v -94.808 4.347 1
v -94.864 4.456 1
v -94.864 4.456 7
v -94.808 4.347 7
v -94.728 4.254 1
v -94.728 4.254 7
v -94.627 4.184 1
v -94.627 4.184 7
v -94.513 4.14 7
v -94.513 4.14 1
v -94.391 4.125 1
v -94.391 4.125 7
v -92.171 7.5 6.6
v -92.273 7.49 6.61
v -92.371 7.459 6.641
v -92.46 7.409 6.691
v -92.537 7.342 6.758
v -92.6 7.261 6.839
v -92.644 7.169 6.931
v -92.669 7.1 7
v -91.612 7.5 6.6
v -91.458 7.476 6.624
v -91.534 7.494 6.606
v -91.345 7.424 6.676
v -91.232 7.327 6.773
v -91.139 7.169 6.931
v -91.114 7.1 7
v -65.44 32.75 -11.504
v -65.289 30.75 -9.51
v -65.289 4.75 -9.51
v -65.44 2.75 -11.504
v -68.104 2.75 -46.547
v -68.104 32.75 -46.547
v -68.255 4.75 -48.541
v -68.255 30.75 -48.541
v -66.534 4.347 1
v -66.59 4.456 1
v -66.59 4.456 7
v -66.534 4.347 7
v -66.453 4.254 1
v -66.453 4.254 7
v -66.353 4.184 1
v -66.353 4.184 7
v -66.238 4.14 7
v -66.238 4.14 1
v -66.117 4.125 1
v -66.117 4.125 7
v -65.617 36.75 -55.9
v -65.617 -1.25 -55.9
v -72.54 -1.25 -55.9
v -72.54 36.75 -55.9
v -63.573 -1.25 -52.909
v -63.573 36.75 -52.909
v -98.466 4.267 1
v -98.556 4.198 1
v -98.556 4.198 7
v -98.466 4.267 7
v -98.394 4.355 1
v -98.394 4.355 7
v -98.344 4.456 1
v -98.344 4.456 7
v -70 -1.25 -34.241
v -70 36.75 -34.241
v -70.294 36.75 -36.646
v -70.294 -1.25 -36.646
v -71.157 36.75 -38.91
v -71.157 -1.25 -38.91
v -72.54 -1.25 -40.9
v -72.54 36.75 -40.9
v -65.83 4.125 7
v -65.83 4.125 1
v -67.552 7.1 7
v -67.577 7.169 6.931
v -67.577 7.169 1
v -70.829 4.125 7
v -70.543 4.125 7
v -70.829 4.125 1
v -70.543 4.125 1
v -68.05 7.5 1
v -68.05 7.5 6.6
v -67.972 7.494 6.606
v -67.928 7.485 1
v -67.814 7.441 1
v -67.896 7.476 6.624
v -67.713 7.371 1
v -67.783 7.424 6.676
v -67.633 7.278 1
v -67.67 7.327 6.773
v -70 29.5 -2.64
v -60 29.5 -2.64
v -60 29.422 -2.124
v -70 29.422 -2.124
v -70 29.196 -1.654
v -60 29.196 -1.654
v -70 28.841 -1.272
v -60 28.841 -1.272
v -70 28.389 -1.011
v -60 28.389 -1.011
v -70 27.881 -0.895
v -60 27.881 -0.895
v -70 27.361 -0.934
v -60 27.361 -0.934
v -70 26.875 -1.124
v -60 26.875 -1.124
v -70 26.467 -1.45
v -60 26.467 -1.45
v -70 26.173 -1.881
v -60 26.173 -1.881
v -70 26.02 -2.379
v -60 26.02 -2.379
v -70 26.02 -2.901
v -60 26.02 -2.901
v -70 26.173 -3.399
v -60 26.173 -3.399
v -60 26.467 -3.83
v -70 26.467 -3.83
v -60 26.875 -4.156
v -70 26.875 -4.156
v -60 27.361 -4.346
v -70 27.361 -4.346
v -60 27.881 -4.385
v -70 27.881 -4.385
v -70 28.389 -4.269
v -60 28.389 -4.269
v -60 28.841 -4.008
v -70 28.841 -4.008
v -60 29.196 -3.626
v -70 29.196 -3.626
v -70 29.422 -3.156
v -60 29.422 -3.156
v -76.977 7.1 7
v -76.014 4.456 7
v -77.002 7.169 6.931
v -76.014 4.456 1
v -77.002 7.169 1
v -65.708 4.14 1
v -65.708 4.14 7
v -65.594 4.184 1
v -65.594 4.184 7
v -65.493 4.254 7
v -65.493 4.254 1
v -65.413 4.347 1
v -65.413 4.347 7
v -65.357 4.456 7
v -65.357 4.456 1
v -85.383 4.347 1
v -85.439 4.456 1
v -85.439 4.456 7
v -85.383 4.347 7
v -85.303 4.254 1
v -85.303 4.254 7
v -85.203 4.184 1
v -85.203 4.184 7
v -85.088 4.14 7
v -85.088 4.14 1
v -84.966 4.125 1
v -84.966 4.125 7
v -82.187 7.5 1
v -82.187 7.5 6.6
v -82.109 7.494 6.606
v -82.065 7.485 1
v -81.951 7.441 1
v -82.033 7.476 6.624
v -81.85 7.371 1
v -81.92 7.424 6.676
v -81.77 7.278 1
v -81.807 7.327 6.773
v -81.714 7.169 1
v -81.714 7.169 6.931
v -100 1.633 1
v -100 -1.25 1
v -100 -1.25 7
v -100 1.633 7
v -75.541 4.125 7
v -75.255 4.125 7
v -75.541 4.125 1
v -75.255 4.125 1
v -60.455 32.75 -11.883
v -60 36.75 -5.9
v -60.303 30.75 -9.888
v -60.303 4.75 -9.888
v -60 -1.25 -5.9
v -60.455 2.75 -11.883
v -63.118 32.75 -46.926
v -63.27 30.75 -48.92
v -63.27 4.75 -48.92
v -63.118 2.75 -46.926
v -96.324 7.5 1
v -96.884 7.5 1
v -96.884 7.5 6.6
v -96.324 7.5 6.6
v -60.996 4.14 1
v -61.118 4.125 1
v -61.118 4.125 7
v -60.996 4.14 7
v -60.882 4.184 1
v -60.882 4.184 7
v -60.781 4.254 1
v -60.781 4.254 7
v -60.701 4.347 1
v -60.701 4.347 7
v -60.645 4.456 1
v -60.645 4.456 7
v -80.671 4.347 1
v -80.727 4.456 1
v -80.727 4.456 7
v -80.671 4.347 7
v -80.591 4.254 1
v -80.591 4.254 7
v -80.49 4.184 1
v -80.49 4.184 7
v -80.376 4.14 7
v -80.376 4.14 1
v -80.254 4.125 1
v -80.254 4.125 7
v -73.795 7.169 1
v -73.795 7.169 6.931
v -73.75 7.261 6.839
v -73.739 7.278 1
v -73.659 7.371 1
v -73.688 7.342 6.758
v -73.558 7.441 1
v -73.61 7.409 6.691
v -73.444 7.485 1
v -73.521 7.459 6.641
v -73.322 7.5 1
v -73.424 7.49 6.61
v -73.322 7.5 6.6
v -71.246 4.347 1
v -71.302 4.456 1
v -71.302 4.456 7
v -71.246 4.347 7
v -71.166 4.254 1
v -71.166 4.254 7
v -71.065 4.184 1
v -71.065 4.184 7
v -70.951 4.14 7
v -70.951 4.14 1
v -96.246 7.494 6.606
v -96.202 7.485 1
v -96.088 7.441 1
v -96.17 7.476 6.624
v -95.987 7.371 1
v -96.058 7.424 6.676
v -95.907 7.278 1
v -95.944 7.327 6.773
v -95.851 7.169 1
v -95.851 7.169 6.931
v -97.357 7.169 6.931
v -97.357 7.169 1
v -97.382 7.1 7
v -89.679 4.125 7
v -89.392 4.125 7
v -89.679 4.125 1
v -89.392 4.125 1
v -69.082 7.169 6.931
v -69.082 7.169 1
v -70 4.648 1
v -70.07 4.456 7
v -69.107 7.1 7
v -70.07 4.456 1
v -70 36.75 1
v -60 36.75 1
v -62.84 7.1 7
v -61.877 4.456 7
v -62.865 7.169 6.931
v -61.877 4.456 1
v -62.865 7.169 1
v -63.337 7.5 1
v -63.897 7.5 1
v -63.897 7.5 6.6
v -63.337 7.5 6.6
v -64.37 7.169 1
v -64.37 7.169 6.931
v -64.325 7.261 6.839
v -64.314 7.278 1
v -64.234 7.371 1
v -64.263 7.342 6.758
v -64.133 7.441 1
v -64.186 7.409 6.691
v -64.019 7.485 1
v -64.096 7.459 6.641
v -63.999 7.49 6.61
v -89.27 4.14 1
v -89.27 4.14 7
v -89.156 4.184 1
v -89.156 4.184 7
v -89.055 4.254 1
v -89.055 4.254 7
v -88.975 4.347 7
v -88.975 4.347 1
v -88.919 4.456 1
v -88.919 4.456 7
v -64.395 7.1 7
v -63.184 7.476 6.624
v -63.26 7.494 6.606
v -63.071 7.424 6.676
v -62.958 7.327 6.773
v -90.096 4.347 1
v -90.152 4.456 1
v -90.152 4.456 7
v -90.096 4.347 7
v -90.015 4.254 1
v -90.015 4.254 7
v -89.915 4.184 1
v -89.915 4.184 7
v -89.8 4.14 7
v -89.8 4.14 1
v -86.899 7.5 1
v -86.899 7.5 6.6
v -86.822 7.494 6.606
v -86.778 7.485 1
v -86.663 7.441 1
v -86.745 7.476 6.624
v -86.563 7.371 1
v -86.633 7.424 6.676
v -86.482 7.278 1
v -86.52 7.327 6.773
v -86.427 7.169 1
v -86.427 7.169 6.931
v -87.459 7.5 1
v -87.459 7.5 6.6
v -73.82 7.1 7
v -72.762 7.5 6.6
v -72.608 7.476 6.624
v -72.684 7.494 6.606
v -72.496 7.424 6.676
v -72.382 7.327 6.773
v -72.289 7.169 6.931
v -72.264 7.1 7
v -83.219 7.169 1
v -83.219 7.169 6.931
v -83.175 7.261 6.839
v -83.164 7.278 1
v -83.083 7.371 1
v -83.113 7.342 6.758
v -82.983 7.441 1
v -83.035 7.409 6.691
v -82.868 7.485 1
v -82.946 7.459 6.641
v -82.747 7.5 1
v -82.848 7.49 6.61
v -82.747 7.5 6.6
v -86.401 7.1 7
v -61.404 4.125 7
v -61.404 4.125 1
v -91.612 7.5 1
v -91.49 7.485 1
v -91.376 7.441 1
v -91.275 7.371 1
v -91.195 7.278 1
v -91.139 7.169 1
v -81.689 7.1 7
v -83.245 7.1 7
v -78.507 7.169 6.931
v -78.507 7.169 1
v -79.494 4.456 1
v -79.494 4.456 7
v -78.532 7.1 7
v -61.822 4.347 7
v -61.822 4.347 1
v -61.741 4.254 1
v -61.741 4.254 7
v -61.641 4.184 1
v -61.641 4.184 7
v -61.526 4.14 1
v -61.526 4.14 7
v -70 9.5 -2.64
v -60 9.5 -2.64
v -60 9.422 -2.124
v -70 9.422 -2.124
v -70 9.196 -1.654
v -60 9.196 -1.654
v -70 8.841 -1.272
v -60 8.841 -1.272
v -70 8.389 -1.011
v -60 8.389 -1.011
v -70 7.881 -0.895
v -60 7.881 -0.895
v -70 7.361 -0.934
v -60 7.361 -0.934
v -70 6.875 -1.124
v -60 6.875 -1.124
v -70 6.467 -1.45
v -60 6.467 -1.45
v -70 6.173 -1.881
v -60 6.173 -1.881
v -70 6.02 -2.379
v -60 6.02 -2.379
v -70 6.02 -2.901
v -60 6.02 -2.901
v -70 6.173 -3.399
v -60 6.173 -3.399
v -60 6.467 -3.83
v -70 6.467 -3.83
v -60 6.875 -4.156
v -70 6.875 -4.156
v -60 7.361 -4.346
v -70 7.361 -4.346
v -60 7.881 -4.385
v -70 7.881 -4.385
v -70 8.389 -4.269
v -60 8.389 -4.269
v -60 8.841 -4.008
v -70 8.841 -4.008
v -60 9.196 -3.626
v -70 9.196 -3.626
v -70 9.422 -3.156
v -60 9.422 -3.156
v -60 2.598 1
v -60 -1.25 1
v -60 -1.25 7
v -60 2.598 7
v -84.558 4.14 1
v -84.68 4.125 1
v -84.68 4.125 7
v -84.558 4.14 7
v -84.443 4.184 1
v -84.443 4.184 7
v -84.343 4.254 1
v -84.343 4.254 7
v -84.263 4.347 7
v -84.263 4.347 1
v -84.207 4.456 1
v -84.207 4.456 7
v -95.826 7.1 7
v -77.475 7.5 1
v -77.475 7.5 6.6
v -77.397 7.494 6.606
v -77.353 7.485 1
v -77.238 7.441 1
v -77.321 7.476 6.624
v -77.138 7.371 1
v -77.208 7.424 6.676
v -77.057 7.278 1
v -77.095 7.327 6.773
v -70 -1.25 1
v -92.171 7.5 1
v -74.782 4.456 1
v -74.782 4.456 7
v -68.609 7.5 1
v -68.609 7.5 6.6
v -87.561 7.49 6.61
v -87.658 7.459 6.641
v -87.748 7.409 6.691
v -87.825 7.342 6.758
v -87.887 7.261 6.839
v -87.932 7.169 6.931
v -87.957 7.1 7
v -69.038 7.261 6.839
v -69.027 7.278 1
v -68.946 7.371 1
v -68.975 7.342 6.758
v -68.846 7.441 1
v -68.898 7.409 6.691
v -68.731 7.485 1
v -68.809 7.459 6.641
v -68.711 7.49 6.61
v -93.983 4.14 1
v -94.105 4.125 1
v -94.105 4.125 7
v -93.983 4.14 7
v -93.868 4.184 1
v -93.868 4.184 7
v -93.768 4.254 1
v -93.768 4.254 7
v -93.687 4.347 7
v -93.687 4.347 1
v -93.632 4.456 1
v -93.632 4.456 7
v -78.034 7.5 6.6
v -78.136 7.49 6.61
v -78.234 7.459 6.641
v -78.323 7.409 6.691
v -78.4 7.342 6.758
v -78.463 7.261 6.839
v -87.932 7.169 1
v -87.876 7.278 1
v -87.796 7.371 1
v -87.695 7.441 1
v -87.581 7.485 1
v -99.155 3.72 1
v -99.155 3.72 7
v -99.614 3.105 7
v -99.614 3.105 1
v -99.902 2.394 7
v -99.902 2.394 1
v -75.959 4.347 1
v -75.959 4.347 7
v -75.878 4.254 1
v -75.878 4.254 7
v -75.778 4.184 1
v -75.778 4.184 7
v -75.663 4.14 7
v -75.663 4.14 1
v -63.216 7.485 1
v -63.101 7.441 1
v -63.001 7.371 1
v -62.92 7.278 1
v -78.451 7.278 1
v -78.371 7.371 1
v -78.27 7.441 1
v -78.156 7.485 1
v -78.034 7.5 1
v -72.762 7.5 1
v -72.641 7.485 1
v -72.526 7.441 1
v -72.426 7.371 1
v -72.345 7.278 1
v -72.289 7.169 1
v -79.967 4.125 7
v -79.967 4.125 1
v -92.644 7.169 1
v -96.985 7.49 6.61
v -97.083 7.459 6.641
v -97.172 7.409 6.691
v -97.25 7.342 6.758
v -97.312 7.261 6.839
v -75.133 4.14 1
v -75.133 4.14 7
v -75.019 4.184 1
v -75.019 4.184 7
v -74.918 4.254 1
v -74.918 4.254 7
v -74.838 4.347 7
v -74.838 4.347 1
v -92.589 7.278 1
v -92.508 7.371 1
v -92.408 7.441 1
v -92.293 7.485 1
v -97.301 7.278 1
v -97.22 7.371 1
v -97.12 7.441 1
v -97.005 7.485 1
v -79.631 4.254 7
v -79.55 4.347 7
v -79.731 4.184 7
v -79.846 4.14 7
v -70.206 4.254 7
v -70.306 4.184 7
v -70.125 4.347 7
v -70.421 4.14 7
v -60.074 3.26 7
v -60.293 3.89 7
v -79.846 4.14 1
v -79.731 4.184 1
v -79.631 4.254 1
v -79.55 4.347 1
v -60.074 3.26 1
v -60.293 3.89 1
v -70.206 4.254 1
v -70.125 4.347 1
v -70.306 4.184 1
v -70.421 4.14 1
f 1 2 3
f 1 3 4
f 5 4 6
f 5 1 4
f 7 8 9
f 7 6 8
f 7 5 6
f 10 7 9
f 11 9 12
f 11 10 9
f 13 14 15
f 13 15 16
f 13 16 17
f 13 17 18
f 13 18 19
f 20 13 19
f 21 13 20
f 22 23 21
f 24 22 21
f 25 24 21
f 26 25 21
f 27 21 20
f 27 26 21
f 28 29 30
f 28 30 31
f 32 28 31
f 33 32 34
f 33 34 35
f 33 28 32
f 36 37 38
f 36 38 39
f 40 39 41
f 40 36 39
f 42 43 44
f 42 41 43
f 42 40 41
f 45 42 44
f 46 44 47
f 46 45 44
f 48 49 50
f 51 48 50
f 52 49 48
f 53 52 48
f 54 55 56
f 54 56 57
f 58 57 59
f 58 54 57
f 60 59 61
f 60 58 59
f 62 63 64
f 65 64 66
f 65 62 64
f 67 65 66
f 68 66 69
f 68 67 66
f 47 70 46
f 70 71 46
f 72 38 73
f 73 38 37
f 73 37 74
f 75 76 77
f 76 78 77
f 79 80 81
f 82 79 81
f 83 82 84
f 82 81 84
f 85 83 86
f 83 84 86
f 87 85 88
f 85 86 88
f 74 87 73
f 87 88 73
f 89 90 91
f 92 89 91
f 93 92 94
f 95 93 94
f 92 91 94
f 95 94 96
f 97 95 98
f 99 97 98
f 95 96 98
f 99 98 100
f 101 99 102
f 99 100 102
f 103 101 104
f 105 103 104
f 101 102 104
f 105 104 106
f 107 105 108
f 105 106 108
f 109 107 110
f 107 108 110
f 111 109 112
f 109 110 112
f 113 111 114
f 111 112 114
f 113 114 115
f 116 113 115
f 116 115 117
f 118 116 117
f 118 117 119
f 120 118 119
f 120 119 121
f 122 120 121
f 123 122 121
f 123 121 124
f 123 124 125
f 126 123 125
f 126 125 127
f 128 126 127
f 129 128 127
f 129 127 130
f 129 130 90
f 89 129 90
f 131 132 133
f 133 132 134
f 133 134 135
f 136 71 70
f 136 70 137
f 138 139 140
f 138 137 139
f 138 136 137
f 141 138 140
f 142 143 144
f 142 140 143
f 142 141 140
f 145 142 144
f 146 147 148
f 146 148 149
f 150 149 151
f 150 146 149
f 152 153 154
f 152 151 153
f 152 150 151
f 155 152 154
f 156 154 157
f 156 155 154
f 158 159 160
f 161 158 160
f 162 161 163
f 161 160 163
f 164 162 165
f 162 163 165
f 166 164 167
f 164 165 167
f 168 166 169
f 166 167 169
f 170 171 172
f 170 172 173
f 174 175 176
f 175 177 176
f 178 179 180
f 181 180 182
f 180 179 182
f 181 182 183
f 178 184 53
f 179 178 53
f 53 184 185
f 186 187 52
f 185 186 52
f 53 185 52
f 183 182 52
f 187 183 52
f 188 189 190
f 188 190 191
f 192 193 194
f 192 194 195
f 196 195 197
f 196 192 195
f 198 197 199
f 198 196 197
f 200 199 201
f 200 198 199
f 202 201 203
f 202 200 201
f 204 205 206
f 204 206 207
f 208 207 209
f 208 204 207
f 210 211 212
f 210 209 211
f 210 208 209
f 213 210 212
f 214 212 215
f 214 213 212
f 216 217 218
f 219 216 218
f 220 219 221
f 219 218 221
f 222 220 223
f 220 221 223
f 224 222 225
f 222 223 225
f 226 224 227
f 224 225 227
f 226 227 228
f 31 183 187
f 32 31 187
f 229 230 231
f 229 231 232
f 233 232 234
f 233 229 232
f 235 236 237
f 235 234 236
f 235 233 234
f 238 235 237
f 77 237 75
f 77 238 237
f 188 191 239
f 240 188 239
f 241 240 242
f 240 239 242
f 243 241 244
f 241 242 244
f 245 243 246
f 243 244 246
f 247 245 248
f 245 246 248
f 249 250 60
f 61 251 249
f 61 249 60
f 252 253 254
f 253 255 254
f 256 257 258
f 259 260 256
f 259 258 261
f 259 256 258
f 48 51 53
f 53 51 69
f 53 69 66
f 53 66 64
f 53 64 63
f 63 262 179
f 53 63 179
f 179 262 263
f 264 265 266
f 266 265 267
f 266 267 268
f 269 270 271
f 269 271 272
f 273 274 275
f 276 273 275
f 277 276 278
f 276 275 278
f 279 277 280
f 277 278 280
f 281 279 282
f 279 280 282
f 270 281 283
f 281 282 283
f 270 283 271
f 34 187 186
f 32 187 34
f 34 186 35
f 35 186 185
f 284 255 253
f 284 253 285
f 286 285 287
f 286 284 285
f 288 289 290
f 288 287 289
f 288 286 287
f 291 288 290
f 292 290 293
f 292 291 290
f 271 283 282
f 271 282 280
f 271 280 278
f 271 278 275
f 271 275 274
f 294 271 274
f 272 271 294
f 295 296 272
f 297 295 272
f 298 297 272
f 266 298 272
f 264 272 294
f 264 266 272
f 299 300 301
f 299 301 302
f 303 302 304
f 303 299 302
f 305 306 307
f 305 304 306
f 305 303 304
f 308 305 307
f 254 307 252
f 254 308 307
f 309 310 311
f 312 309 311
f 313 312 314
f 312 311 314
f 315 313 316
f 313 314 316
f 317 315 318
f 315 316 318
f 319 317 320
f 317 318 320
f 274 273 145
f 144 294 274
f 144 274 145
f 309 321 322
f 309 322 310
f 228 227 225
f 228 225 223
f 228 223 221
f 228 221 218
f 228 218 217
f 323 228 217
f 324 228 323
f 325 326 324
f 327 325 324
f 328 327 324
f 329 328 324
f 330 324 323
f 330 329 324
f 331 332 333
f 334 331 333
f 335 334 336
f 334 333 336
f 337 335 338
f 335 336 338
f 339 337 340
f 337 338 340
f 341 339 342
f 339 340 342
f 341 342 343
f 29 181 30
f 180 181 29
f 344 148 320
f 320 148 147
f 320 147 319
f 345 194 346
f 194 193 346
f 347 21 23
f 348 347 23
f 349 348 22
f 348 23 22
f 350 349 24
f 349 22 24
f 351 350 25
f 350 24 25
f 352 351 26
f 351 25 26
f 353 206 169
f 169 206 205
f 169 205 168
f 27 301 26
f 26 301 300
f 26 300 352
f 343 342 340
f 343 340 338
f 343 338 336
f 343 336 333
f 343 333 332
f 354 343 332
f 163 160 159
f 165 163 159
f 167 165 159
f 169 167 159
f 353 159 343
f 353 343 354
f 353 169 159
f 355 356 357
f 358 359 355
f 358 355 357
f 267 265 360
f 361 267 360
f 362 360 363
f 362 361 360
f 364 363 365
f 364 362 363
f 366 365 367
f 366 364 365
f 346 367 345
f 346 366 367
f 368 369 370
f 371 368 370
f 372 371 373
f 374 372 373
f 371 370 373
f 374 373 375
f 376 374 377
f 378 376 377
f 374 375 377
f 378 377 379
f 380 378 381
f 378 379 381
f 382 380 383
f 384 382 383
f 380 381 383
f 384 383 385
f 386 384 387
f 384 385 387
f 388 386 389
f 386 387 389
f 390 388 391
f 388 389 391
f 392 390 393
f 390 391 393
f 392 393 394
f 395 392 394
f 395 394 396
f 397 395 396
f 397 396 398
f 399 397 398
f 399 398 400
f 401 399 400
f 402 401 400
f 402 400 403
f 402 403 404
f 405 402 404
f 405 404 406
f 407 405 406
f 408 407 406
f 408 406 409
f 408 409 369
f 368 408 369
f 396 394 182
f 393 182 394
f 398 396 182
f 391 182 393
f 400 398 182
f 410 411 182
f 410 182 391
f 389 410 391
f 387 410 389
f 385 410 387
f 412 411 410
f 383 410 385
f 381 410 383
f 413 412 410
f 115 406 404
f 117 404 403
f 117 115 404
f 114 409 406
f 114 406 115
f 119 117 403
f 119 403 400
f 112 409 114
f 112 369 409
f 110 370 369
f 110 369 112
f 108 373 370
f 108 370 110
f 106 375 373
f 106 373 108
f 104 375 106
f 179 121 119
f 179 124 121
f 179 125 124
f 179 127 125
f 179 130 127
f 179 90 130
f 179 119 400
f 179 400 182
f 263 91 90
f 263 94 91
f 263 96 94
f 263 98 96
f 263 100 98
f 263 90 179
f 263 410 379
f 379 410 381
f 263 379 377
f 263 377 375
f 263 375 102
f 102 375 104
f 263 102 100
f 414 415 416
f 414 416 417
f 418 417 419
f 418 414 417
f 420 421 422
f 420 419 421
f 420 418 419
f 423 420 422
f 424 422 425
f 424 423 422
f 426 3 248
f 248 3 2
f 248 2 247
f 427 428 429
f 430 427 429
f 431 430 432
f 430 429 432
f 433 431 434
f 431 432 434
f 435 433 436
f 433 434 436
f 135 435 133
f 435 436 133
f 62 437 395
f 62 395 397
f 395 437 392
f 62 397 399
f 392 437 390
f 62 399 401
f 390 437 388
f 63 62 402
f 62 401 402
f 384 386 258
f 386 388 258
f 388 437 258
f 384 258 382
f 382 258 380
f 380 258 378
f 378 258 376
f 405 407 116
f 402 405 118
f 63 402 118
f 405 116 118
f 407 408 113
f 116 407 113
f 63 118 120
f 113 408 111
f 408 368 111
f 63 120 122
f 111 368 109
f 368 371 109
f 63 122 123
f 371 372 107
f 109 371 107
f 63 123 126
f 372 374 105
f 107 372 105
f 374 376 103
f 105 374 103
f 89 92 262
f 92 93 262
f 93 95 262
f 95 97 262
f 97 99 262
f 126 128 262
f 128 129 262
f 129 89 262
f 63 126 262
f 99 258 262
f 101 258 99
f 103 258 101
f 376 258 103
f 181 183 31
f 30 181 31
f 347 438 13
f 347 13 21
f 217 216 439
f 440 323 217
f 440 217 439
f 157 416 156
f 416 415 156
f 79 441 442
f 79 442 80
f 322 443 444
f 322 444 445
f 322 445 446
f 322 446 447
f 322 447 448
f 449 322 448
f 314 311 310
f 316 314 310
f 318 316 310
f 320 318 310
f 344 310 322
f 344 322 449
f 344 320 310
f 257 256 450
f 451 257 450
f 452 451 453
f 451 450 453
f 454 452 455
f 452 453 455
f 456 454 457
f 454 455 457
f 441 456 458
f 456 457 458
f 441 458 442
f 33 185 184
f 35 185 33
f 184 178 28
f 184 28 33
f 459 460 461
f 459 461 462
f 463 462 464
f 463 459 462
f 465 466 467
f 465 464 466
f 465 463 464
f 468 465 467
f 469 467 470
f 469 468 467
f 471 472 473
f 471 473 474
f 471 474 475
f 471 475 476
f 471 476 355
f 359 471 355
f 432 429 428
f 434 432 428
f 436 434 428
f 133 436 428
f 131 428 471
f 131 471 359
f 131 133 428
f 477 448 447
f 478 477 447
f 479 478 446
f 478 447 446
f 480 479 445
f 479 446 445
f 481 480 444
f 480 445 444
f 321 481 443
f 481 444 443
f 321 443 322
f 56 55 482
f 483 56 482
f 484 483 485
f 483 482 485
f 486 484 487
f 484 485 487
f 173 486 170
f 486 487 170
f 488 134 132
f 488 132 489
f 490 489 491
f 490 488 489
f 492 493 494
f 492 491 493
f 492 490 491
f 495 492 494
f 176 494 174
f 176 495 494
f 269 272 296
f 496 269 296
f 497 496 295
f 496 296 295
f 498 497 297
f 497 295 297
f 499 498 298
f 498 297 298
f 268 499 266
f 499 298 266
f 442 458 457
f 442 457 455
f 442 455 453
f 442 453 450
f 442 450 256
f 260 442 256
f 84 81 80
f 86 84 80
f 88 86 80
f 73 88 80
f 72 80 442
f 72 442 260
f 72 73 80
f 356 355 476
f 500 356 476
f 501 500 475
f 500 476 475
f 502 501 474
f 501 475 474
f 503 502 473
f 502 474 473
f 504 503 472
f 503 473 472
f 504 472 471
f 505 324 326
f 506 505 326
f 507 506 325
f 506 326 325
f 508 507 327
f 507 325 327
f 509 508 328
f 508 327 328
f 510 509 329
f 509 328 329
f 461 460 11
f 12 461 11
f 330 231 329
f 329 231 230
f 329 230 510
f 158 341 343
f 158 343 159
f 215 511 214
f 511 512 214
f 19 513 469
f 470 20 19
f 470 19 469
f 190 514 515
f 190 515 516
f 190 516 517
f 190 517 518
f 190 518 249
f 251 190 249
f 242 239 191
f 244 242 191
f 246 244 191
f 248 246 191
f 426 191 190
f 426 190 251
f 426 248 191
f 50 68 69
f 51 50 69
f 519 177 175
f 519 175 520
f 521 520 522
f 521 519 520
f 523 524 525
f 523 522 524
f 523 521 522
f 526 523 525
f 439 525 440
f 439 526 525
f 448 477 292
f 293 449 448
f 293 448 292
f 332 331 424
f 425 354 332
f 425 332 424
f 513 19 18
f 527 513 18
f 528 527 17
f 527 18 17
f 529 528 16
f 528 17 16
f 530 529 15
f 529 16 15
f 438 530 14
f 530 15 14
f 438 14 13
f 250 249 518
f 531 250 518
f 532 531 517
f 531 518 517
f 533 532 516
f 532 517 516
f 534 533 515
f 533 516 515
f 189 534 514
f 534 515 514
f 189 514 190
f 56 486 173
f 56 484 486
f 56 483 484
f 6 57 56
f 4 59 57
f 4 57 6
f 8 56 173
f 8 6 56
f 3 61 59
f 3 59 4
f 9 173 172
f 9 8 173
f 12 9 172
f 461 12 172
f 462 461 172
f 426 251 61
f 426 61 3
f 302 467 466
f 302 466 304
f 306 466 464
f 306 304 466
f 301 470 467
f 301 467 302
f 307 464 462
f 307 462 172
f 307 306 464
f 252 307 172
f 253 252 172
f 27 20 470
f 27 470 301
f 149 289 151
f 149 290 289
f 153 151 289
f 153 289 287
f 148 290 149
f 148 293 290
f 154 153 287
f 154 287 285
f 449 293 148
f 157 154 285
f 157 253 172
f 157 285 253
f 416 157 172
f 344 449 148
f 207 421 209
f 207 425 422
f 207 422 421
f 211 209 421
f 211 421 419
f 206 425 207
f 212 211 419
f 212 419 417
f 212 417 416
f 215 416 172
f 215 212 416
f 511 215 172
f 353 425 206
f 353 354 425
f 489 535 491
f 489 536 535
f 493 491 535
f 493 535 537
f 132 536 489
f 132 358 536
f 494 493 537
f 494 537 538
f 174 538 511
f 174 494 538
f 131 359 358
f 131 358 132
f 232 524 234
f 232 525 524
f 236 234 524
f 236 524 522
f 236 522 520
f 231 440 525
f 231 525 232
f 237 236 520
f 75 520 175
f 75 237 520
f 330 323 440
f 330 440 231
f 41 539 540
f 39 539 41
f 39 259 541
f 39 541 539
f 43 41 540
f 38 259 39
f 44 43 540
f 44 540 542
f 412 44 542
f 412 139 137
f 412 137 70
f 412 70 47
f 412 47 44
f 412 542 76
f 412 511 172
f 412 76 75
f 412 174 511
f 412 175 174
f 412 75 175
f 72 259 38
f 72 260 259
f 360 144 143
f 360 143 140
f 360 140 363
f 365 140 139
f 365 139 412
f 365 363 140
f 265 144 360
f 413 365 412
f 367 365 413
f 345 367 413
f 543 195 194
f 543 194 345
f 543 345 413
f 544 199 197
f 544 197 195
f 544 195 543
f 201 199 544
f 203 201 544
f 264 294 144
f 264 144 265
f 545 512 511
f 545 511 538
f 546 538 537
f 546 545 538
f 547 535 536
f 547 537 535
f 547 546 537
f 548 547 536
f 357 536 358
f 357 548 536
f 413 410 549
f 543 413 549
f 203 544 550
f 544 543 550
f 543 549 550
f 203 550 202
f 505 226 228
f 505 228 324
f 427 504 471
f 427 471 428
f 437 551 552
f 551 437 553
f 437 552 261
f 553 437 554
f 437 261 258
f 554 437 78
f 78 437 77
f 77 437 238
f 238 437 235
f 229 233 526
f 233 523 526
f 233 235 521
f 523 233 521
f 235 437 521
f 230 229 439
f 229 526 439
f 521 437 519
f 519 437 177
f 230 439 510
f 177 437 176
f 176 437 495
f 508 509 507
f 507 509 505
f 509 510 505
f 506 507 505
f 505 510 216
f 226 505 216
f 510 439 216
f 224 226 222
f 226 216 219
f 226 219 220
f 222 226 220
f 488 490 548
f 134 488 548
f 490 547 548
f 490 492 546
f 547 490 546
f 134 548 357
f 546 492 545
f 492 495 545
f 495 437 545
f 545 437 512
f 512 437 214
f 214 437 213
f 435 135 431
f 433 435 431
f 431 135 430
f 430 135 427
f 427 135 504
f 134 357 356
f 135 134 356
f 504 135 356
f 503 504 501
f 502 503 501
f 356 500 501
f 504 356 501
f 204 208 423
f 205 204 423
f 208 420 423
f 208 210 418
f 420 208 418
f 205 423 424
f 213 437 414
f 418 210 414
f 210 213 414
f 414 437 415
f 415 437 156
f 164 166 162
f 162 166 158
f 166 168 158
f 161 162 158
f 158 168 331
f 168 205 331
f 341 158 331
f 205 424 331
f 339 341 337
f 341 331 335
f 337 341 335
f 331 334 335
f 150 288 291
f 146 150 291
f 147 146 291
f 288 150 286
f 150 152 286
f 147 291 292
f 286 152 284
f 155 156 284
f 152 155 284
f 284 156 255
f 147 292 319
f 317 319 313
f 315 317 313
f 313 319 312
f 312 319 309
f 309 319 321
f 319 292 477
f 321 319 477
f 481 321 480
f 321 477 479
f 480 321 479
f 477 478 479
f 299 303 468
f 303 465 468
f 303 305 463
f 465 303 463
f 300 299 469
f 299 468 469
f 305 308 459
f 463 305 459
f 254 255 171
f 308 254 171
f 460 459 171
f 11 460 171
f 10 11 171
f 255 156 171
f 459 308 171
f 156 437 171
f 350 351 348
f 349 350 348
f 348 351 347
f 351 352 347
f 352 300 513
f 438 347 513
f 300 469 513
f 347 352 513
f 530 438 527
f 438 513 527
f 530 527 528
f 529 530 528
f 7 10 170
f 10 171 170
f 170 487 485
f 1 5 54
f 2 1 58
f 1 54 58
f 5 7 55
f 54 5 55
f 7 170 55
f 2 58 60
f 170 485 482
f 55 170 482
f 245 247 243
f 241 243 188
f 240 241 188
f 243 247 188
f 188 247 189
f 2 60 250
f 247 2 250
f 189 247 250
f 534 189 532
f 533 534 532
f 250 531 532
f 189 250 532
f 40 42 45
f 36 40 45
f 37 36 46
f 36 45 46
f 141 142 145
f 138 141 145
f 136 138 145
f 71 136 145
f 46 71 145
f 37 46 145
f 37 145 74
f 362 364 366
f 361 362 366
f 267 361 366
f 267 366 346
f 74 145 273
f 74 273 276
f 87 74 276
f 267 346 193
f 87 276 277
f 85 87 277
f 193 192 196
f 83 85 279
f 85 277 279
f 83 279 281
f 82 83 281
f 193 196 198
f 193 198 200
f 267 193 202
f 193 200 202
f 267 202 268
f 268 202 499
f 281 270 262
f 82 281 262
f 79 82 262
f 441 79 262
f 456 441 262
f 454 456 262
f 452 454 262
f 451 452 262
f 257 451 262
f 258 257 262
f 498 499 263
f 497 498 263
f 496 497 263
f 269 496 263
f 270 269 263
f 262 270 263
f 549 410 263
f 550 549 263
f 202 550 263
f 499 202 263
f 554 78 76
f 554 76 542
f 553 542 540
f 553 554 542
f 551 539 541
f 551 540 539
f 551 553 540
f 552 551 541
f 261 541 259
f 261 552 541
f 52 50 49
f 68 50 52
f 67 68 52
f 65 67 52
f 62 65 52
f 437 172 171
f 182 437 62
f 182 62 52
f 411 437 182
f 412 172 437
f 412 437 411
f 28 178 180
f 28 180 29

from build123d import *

# Parameters (mm, degrees)
BOSS_EXTRUDE1_DEPTH      = 7.5
BOSS_EXTRUDE1_DEPTH_BACK = 7.5
SKETCH3_W                = 200
SKETCH3_H                = 15
CUT_EXTRUDE1_DEPTH       = 101.560926806
FILLET1_R                = 0.503257554
LPATTERN1_COUNT          = 42
LPATTERN1_PITCH          = 4.71238898
FILLET1_OF_LPATTERN1_R   = 0.503257554
CUT_EXTRUDE2_DEPTH       = 101.560926806
CUT_EXTRUDE2_DEPTH_BACK  = 101.560926806
SKETCH5_W                = 4.71238898
SKETCH5_H                = 3.375
CUT_EXTRUDE3_DEPTH       = 101.560926806
CUT_EXTRUDE3_DEPTH_BACK  = 101.560926806
SKETCH6_W                = 13.890612777
SKETCH6_H                = 21.950597968
CUT_EXTRUDE6_DEPTH       = 101.560926806
CUT_EXTRUDE6_DEPTH_BACK  = 101.560926806
SKETCH8_W                = 175.100830171
SKETCH8_H                = 44.946806771
SKETCH9_W                = 55.501850732
SKETCH9_H                = 10.784038355
CUT_EXTRUDE7_DEPTH       = 101.560926806
SKETCH10_W               = 10
SKETCH10_H               = 38
BOSS_EXTRUDE2_DEPTH      = 6.9
SKETCH11_W               = 12.54
SKETCH11_H               = 38
BOSS_EXTRUDE3_DEPTH      = 50
SKETCH12_W               = 2.54
SKETCH12_H               = 35
CUT_EXTRUDE8_DEPTH       = 121.701325593
CHAMFER1_SIZE            = 3
CHAMFER1_SIZE2           = 1.816762814
FILLET2_R                = 10
SKETCH13_W               = 39.144192087
SKETCH13_H               = 30
CUT_EXTRUDE9_DEPTH       = 5
CHAMFER2_SIZE            = 2
SKETCH14_R               = 1.75
CUT_EXTRUDE10_DEPTH      = 78.944675893
SKETCH15_W               = 75.463673411
SKETCH15_H               = 29.481435093
CUT_EXTRUDE11_DEPTH      = 0.5
FILLET3_R                = 3
CUT_EXTRUDE12_DEPTH      = 78.944675893
CUT_EXTRUDE12_DEPTH_BACK = 78.944675893


with BuildPart() as part:
    # Sketch3 → Boss-Extrude1 (new, two sides: drawn at the far end of the back side and taken through both)
    with BuildSketch(Plane.XY.offset(-BOSS_EXTRUDE1_DEPTH_BACK)):
        Rectangle(SKETCH3_W, SKETCH3_H)
    extrude(amount=BOSS_EXTRUDE1_DEPTH + BOSS_EXTRUDE1_DEPTH_BACK)

    # Sketch4 → Cut-Extrude1 (cut, symmetric)
    with BuildSketch(Plane.XY):
        Polygon((-94.247779608, 7.5), (-94.247779608, 4.125), (-94.743432664, 4.125), (-95.971832204, 7.5), align=None)
        Polygon((-97.236115992, 7.5), (-98.464515532, 4.125), (-98.960168588, 4.125), (-98.960168588, 7.5), align=None)
    cut_extrude1 = extrude(amount=CUT_EXTRUDE1_DEPTH, both=True, mode=Mode.SUBTRACT)

    # Fillet1
    fillet1_edges = [part.edges().sort_by_distance(p)[0] for p in [
        (-95.971832204, 7.5, 0),
        (-94.743432664, 4.125, 0),
        (-97.236115992, 7.5, 0),
        (-98.464515532, 4.125, 0),
    ]]
    fillet(fillet1_edges, radius=FILLET1_R)

    # LPattern1: Cut-Extrude1 ×42
    with Locations(*[(i * LPATTERN1_PITCH, 0, 0) for i in range(1, LPATTERN1_COUNT)]):
        add(cut_extrude1, mode=Mode.SUBTRACT)

    # Fillet1 of LPattern1
    fillet1_of_lpattern1_edges = [part.edges().sort_by_distance(p)[0] for p in [
        (-91.259443224, 7.5, 0),
        (-90.031043683, 4.125, 0),
        (-92.523727011, 7.5, 0),
        (-93.752126552, 4.125, 0),
        (-86.547054243, 7.5, 0),
        (-85.318654703, 4.125, 0),
        (-87.811338031, 7.5, 0),
        (-89.039737571, 4.125, 0),
        (-81.834665263, 7.5, 0),
        (-80.606265722, 4.125, 0),
        (-83.09894905, 7.5, 0),
        (-84.327348591, 4.125, 0),
        (-77.122276283, 7.5, 0),
        (-75.893876742, 4.125, 0),
        (-78.38656007, 7.5, 0),
        (-79.614959611, 4.125, 0),
        (-72.409887302, 7.5, 0),
        (-71.181487762, 4.125, 0),
        (-73.67417109, 7.5, 0),
        (-74.90257063, 4.125, 0),
        (-67.697498322, 7.5, 0),
        (-66.469098781, 4.125, 0),
        (-68.961782109, 7.5, 0),
        (-70.19018165, 4.125, 0),
        (-62.985109342, 7.5, 0),
        (-61.756709801, 4.125, 0),
        (-64.249393129, 7.5, 0),
        (-65.47779267, 4.125, 0),
        (-58.272720361, 7.5, 0),
        (-57.04432082, 4.125, 0),
        (-59.537004149, 7.5, 0),
        (-60.765403689, 4.125, 0),
        (-53.560331381, 7.5, 0),
        (-52.33193184, 4.125, 0),
        (-54.824615168, 7.5, 0),
        (-56.053014709, 4.125, 0),
        (-48.8479424, 7.5, 0),
        (-47.61954286, 4.125, 0),
        (-50.112226188, 7.5, 0),
        (-51.340625728, 4.125, 0),
        (-44.13555342, 7.5, 0),
        (-42.907153879, 4.125, 0),
        (-45.399837207, 7.5, 0),
        (-46.628236748, 4.125, 0),
        (-39.42316444, 7.5, 0),
        (-38.194764899, 4.125, 0),
        (-40.687448227, 7.5, 0),
        (-41.915847768, 4.125, 0),
        (-34.710775459, 7.5, 0),
        (-33.482375919, 4.125, 0),
        (-35.975059247, 7.5, 0),
        (-37.203458787, 4.125, 0),
        (-29.998386479, 7.5, 0),
        (-28.769986938, 4.125, 0),
        (-31.262670266, 7.5, 0),
        (-32.491069807, 4.125, 0),
        (-25.285997498, 7.5, 0),
        (-24.057597958, 4.125, 0),
        (-26.550281286, 7.5, 0),
        (-27.778680826, 4.125, 0),
        (-20.573608518, 7.5, 0),
        (-19.345208977, 4.125, 0),
        (-21.837892305, 7.5, 0),
        (-23.066291846, 4.125, 0),
        (-15.861219538, 7.5, 0),
        (-14.632819997, 4.125, 0),
        (-17.125503325, 7.5, 0),
        (-18.353902866, 4.125, 0),
        (-11.148830557, 7.5, 0),
        (-9.920431017, 4.125, 0),
        (-12.413114345, 7.5, 0),
        (-13.641513885, 4.125, 0),
        (-6.436441577, 7.5, 0),
        (-5.208042036, 4.125, 0),
        (-7.700725364, 7.5, 0),
        (-8.929124905, 4.125, 0),
        (-1.724052597, 7.5, 0),
        (-0.495653056, 4.125, 0),
        (-2.988336384, 7.5, 0),
        (-4.216735925, 4.125, 0),
        (2.988336384, 7.5, 0),
        (4.216735925, 4.125, 0),
        (1.724052596, 7.5, 0),
        (0.495653056, 4.125, 0),
        (7.700725364, 7.5, 0),
        (8.929124905, 4.125, 0),
        (6.436441577, 7.5, 0),
        (5.208042036, 4.125, 0),
        (12.413114345, 7.5, 0),
        (13.641513885, 4.125, 0),
        (11.148830557, 7.5, 0),
        (9.920431017, 4.125, 0),
        (17.125503325, 7.5, 0),
        (18.353902866, 4.125, 0),
        (15.861219538, 7.5, 0),
        (14.632819997, 4.125, 0),
        (21.837892305, 7.5, 0),
        (23.066291846, 4.125, 0),
        (20.573608518, 7.5, 0),
        (19.345208977, 4.125, 0),
        (26.550281286, 7.5, 0),
        (27.778680826, 4.125, 0),
        (25.285997498, 7.5, 0),
        (24.057597958, 4.125, 0),
        (31.262670266, 7.5, 0),
        (32.491069807, 4.125, 0),
        (29.998386479, 7.5, 0),
        (28.769986938, 4.125, 0),
        (35.975059247, 7.5, 0),
        (37.203458787, 4.125, 0),
        (34.710775459, 7.5, 0),
        (33.482375919, 4.125, 0),
        (40.687448227, 7.5, 0),
        (41.915847768, 4.125, 0),
        (39.42316444, 7.5, 0),
        (38.194764899, 4.125, 0),
        (45.399837207, 7.5, 0),
        (46.628236748, 4.125, 0),
        (44.13555342, 7.5, 0),
        (42.907153879, 4.125, 0),
        (50.112226188, 7.5, 0),
        (51.340625728, 4.125, 0),
        (48.8479424, 7.5, 0),
        (47.61954286, 4.125, 0),
        (54.824615168, 7.5, 0),
        (56.053014709, 4.125, 0),
        (53.560331381, 7.5, 0),
        (52.33193184, 4.125, 0),
        (59.537004148, 7.5, 0),
        (60.765403689, 4.125, 0),
        (58.272720361, 7.5, 0),
        (57.04432082, 4.125, 0),
        (64.249393129, 7.5, 0),
        (65.47779267, 4.125, 0),
        (62.985109341, 7.5, 0),
        (61.756709801, 4.125, 0),
        (68.961782109, 7.5, 0),
        (70.19018165, 4.125, 0),
        (67.697498322, 7.5, 0),
        (66.469098781, 4.125, 0),
        (73.67417109, 7.5, 0),
        (74.90257063, 4.125, 0),
        (72.409887302, 7.5, 0),
        (71.181487762, 4.125, 0),
        (78.38656007, 7.5, 0),
        (79.614959611, 4.125, 0),
        (77.122276283, 7.5, 0),
        (75.893876742, 4.125, 0),
        (83.09894905, 7.5, 0),
        (84.327348591, 4.125, 0),
        (81.834665263, 7.5, 0),
        (80.606265722, 4.125, 0),
        (87.811338031, 7.5, 0),
        (89.039737571, 4.125, 0),
        (86.547054243, 7.5, 0),
        (85.318654703, 4.125, 0),
        (92.523727011, 7.5, 0),
        (93.752126552, 4.125, 0),
        (91.259443224, 7.5, 0),
        (90.031043683, 4.125, 0),
        (97.236115992, 7.5, 0),
        (98.464515532, 4.125, 0),
        (95.971832204, 7.5, 0),
        (94.743432664, 4.125, 0),
    ]]
    fillet(fillet1_of_lpattern1_edges, radius=FILLET1_OF_LPATTERN1_R)

    # Sketch5 → Cut-Extrude2 (cut, two sides: drawn at the far end of the back side and taken through both)
    with BuildSketch(Plane.XY.offset(-CUT_EXTRUDE2_DEPTH_BACK)):
        with Locations((-101.316363078, 5.8125)):
            Rectangle(SKETCH5_W, SKETCH5_H)
        with Locations((101.316363078, 5.8125)):
            Rectangle(SKETCH5_W, SKETCH5_H)
    extrude(amount=CUT_EXTRUDE2_DEPTH + CUT_EXTRUDE2_DEPTH_BACK, mode=Mode.SUBTRACT)

    # Sketch6 → Cut-Extrude3 (cut, two sides: drawn at the far end of the back side and taken through both)
    with BuildSketch(Plane(origin=(0, 0, 0), x_dir=(0, 0, -1), z_dir=(1, 0, 0)).offset(-CUT_EXTRUDE3_DEPTH_BACK)):
        with Locations((5.945306389, -0.750264579)):
            Rectangle(SKETCH6_W, SKETCH6_H)
    extrude(amount=CUT_EXTRUDE3_DEPTH + CUT_EXTRUDE3_DEPTH_BACK, mode=Mode.SUBTRACT)

    # Sketch8 → Cut-Extrude6 (cut, two sides: drawn at the far end of the back side and taken through both)
    with BuildSketch(Plane.XY.offset(-CUT_EXTRUDE6_DEPTH_BACK)):
        with Locations((27.550415086, 7.242613414)):
            Rectangle(SKETCH8_W, SKETCH8_H)
    extrude(amount=CUT_EXTRUDE6_DEPTH + CUT_EXTRUDE6_DEPTH_BACK, mode=Mode.SUBTRACT)

    # Sketch9 → Cut-Extrude7 (cut, through all)
    with BuildSketch(Plane.XY):
        with Locations((-76.828993169, -6.642019178)):
            Rectangle(SKETCH9_W, SKETCH9_H)
    extrude(amount=CUT_EXTRUDE7_DEPTH, mode=Mode.SUBTRACT)

    # Sketch10 → Boss-Extrude2 (add)
    with BuildSketch(Plane(origin=(0, 0, 1), x_dir=(-1, 0, 0), z_dir=(0, 0, -1))):
        with Locations((65, 17.75)):
            Rectangle(SKETCH10_W, SKETCH10_H)
    extrude(amount=BOSS_EXTRUDE2_DEPTH)

    # Sketch11 → Boss-Extrude3 (add)
    with BuildSketch(Plane(origin=(0, 0, -5.9), x_dir=(-1, 0, 0), z_dir=(0, 0, -1))):
        with Locations((66.27, 17.75)):
            Rectangle(SKETCH11_W, SKETCH11_H)
    extrude(amount=BOSS_EXTRUDE3_DEPTH)

    # Sketch12 → Cut-Extrude8 (cut, through all)
    with BuildSketch(Plane.XZ.offset(1.25)):
        with Locations((-71.27, -23.4)):
            Rectangle(SKETCH12_W, SKETCH12_H)
        Polygon((-60, -5.9), (-63.8, -55.9), (-60, -55.9), align=None)
    extrude(amount=-CUT_EXTRUDE8_DEPTH, mode=Mode.SUBTRACT)

    # Chamfer1
    chamfer1_edges = [part.edges().sort_by_distance(p)[0] for p in [
        (-63.8, 17.75, -55.9),
    ]]
    chamfer1_side = [part.faces().sort_by_distance(p)[0] for p in [
        (-61.9, 17.75, -30.9),
    ]]
    chamfer(chamfer1_edges, length=CHAMFER1_SIZE, length2=CHAMFER1_SIZE2, reference=chamfer1_side[0])

    # Fillet2
    # the kernel refuses this fillet: 10 mm, written as the material it adds along each edge
    with BuildSketch(Plane(origin=(-70, -1.25, -40.9), x_dir=(-1, 0, 0), z_dir=(0, 1, 0))) as fillet2_piece_1:
        with BuildLine():
            CenterArc((10, 6.659459438), FILLET2_R, 180, 41.754936598)
            Line((0, 6.659459438), (-0.2, 6.659459438))
            Line((-0.2, 6.659459438), (-0.2, 0))
            Line((-0.2, 0), (0, -0.2))
            ThreePointArc((0, -0.2), (1.27, -0.2), (2.3908, -0.133189189))
            Line((2.3908, -0.133189189), (2.54, 0))
        make_face()
    extrude(amount=38)

    # Sketch13 → Cut-Extrude9 (cut)
    with BuildSketch(Plane(origin=(-59.20960532, 0, 4.499930004), x_dir=(-0.07578145826840343, 0, -0.997124450900044), z_dir=(0.997124450900044, 0, -0.07578145826840343))):
        with Locations((34.0020178, 17.75)):
            Rectangle(SKETCH13_W, SKETCH13_H)
    extrude(amount=-CUT_EXTRUDE9_DEPTH, mode=Mode.SUBTRACT)

    # Chamfer2
    chamfer2_edges = [part.edges().sort_by_distance(p)[0] for p in [
        (-62.79593696, 2.75, -9.699044158),
        (-62.79593696, 32.75, -9.699044158),
        (-65.762340919, 32.75, -48.730675198),
        (-65.762340919, 2.75, -48.730675198),
    ]]
    chamfer(chamfer2_edges, length=CHAMFER2_SIZE)

    # Sketch14 → Cut-Extrude10 (cut, through all)
    with BuildSketch(Plane(origin=(-60, 0, 0), x_dir=(0, 0, -1), z_dir=(1, 0, 0))):
        with Locations(Location((2.64, 27.75, 0), (0, 0, 90))):
            Circle(SKETCH14_R)
        with Locations(Location((2.64, 7.75, 0), (0, 0, 90))):
            Circle(SKETCH14_R)
    extrude(amount=-CUT_EXTRUDE10_DEPTH, mode=Mode.SUBTRACT)

    # Sketch15 → Cut-Extrude11 (cut)
    with BuildSketch(Plane.XY.offset(7.5)):
        with Locations((-71.80980664, 4.677610669)):
            Rectangle(SKETCH15_W, SKETCH15_H)
    extrude(amount=-CUT_EXTRUDE11_DEPTH, mode=Mode.SUBTRACT)

    # Fillet3
    # the kernel refuses this fillet: 3 mm, written as the material it takes off along each edge
    with BuildSketch(Plane(origin=(-60, 6.227929353, 1), x_dir=(0, -1, 0), z_dir=(0, 0, 1))) as fillet3_piece_1:
        with BuildLine():
            CenterArc((3.630132521, -3), FILLET3_R, 90, 38.275653288)
            Line((1.77179602, -0.644881012), (0, 0))
            Line((0, 0), (3.630132521, 0))
        make_face()
    extrude(amount=15.075331304, mode=Mode.SUBTRACT)
    with BuildSketch(Plane(origin=(-100, 4.125, -5.230049704), x_dir=(0, -1, 0), z_dir=(0, 0, 1))) as fillet3_piece_2:
        with BuildLine():
            CenterArc((2.492019882, 3), FILLET3_R, 211.240510341, 58.759489659)
            Line((-0.072973462, 1.444105033), (-0.329472796, 1.288515537))
            ThreePointArc((-0.329472796, 1.288515537), (-0.3, 1.183099735), (-0.3, 0))
            Line((-0.3, 0), (0, -0.3))
            Line((0, -0.3), (2.492019882, -0.3))
            Line((2.492019882, -0.3), (2.492019882, 0))
        make_face()
    extrude(amount=18.460099408, mode=Mode.SUBTRACT)

    # Sketch16 → Cut-Extrude12 (cut, two sides: drawn at the far end of the back side and taken through both)
    with BuildSketch(Plane.ZY.offset(100).offset(-CUT_EXTRUDE12_DEPTH_BACK)):
        Polygon((6.6, 7.5), (7, 7.1), (7, 7.5), align=None)
    extrude(amount=CUT_EXTRUDE12_DEPTH + CUT_EXTRUDE12_DEPTH_BACK, mode=Mode.SUBTRACT)


solid = part.part
